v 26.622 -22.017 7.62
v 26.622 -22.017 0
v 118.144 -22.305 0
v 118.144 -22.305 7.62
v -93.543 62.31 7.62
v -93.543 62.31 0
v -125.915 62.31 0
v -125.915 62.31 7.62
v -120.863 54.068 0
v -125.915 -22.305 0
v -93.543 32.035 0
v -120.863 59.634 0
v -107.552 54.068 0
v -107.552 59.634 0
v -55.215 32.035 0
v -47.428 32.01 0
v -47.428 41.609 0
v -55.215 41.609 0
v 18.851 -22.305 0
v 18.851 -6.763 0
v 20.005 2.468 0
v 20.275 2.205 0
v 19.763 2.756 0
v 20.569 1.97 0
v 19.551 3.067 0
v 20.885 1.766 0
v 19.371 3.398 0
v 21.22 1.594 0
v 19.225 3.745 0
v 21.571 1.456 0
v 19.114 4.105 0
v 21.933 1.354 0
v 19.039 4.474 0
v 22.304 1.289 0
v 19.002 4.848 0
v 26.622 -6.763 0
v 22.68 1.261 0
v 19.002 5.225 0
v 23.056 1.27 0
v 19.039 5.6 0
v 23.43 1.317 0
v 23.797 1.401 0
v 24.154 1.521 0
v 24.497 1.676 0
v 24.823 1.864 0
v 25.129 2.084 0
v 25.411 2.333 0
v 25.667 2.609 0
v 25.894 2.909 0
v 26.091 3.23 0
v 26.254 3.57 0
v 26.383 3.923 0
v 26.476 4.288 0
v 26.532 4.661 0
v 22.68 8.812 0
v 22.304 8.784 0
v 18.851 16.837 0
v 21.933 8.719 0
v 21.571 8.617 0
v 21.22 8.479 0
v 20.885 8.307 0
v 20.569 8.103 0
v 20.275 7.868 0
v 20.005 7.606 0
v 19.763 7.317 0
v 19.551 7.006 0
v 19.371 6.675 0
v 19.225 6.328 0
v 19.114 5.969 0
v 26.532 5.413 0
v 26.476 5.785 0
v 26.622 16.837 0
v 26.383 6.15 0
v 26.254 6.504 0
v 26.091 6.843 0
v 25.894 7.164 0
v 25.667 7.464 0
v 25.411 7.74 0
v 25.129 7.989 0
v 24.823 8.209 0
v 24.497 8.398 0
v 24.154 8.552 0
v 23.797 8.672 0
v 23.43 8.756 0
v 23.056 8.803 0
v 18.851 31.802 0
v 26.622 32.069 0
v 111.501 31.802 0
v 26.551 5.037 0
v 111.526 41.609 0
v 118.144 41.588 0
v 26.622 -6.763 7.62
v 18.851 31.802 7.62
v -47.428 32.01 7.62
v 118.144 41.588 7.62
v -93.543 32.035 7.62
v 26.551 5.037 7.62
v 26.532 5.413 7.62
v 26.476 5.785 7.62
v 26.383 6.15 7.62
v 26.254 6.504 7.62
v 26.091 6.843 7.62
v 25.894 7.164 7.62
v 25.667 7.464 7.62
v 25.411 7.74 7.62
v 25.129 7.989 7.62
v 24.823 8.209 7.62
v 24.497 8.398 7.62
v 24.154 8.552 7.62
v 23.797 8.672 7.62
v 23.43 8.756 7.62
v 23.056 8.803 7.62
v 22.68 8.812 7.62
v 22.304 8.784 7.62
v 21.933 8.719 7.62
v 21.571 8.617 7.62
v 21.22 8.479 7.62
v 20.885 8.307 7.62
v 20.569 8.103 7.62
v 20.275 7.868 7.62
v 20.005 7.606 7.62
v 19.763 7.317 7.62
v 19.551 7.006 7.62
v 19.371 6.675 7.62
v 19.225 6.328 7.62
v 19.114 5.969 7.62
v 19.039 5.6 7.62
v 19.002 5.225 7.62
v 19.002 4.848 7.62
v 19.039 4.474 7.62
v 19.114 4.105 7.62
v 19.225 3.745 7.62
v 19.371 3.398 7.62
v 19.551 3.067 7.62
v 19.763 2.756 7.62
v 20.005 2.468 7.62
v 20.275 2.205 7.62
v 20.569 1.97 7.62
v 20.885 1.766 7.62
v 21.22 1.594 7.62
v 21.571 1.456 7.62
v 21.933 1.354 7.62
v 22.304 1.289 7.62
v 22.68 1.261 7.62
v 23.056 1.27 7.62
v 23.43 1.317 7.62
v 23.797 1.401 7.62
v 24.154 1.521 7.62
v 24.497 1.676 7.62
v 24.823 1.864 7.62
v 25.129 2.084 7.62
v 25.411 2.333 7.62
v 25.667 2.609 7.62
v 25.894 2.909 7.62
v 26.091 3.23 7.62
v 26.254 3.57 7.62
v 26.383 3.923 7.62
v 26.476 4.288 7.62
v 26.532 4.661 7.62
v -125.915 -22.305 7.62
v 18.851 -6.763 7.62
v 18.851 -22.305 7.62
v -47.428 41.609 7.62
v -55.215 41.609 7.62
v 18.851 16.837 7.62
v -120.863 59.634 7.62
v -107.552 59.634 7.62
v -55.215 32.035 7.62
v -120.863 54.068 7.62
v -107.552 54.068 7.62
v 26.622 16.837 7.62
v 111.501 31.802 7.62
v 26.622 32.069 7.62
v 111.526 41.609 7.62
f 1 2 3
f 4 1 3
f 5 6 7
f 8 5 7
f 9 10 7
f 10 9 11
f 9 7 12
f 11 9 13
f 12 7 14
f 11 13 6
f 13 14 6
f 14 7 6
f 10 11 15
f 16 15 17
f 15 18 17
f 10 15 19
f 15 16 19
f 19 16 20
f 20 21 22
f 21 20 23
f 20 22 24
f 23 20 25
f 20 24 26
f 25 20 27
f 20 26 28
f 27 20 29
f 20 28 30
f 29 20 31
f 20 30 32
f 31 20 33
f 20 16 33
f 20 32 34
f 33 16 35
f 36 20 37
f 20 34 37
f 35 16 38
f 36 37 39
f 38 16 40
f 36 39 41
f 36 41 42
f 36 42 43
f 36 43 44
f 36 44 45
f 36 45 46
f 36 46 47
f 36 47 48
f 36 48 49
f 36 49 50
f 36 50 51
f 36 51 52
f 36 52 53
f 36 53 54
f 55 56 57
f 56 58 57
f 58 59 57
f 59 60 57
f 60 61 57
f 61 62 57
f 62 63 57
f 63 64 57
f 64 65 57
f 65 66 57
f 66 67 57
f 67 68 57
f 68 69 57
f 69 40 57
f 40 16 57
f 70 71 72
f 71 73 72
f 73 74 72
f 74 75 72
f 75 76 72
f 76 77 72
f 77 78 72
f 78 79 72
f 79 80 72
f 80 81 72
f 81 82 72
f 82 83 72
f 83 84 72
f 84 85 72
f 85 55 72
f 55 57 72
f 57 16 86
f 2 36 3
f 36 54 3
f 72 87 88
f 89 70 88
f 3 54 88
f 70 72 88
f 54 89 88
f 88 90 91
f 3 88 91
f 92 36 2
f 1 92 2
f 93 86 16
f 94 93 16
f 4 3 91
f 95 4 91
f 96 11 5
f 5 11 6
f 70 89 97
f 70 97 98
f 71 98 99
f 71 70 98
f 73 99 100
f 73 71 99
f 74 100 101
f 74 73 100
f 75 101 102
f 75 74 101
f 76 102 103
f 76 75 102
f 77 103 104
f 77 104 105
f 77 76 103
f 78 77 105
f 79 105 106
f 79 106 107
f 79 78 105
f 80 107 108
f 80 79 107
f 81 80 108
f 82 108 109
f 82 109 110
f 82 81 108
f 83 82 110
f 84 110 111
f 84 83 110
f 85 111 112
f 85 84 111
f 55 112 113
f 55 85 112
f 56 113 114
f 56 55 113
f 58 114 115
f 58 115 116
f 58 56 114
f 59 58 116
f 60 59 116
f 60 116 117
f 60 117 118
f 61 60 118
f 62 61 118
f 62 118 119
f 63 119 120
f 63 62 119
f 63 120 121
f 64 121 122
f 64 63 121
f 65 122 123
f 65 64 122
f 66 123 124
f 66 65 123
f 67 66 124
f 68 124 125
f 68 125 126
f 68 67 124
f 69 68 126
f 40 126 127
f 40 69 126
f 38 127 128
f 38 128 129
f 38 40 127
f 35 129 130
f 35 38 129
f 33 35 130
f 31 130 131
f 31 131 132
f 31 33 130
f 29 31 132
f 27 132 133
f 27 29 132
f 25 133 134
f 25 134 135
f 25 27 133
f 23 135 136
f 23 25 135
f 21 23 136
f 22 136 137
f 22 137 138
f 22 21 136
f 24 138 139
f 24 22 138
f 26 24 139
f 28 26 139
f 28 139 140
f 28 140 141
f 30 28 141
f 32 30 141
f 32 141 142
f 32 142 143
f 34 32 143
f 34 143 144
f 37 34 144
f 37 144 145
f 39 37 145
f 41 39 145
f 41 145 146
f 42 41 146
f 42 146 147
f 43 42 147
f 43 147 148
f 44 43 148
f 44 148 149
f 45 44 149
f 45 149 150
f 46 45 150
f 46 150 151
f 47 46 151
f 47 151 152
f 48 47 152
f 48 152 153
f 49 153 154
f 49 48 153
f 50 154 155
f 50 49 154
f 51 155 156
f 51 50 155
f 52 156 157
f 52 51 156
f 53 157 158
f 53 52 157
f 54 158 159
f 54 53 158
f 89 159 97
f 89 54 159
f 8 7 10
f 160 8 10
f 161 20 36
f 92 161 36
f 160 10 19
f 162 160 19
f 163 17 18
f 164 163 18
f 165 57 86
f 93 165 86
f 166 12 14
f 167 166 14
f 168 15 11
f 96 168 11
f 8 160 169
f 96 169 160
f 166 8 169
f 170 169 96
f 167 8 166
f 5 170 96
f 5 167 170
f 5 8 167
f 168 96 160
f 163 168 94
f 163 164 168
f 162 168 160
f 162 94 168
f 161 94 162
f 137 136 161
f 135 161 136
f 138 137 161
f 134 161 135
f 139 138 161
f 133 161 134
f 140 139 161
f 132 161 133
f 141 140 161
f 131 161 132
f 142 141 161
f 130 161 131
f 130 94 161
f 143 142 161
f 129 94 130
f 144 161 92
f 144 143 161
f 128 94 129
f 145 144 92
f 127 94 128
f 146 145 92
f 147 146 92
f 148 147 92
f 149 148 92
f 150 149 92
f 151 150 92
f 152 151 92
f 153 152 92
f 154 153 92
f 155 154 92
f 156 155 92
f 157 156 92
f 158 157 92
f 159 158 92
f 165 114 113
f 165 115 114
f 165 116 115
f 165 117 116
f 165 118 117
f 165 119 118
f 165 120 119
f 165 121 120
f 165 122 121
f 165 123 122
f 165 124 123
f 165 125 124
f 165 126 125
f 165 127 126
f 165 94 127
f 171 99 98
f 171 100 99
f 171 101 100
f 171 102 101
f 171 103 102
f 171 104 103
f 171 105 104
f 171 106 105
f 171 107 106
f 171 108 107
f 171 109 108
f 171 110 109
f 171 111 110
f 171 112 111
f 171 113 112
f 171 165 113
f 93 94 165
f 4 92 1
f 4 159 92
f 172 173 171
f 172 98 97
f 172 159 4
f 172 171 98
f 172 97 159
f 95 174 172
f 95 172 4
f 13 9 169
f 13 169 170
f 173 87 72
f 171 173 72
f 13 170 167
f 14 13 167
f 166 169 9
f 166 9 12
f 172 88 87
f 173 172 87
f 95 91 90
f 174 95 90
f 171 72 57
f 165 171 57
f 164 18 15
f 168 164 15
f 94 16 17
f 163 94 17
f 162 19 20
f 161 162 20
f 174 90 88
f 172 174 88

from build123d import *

# Parameters (mm, degrees)
F0_R     = 3.776883
F0_W     = 13.310812
F0_H     = 5.56634
F1_DEPTH = 7.62


with BuildPart() as f1:
    # F0 (on Top) → F1 (new body)
    with BuildSketch(Plane.XY):
        Polygon((-125.915021, 62.309951), (-125.915021, -22.304947), (18.851278, -22.304947), (18.851278, -6.763435), (26.622031, -6.763435), (26.622031, -22.017142), (118.144266, -22.304947), (118.144266, 41.58793), (111.525701, 41.608743), (111.501263, 31.801704), (26.622031, 32.068619), (26.622031, 16.836636), (18.851278, 16.836636), (18.851278, 31.801704), (-47.428191, 32.010129), (-47.428191, 41.608743), (-55.215195, 41.608743), (-55.215195, 32.034616), (-93.54344, 32.034616), (-93.54344, 62.309951), align=None)
        with Locations((22.773762, 5.0366)):
            Circle(F0_R, mode=Mode.SUBTRACT)
        with Locations((-114.20754, 56.850752)):
            Rectangle(F0_W, F0_H, mode=Mode.SUBTRACT)
    extrude(amount=F1_DEPTH)


solid = f1.part
